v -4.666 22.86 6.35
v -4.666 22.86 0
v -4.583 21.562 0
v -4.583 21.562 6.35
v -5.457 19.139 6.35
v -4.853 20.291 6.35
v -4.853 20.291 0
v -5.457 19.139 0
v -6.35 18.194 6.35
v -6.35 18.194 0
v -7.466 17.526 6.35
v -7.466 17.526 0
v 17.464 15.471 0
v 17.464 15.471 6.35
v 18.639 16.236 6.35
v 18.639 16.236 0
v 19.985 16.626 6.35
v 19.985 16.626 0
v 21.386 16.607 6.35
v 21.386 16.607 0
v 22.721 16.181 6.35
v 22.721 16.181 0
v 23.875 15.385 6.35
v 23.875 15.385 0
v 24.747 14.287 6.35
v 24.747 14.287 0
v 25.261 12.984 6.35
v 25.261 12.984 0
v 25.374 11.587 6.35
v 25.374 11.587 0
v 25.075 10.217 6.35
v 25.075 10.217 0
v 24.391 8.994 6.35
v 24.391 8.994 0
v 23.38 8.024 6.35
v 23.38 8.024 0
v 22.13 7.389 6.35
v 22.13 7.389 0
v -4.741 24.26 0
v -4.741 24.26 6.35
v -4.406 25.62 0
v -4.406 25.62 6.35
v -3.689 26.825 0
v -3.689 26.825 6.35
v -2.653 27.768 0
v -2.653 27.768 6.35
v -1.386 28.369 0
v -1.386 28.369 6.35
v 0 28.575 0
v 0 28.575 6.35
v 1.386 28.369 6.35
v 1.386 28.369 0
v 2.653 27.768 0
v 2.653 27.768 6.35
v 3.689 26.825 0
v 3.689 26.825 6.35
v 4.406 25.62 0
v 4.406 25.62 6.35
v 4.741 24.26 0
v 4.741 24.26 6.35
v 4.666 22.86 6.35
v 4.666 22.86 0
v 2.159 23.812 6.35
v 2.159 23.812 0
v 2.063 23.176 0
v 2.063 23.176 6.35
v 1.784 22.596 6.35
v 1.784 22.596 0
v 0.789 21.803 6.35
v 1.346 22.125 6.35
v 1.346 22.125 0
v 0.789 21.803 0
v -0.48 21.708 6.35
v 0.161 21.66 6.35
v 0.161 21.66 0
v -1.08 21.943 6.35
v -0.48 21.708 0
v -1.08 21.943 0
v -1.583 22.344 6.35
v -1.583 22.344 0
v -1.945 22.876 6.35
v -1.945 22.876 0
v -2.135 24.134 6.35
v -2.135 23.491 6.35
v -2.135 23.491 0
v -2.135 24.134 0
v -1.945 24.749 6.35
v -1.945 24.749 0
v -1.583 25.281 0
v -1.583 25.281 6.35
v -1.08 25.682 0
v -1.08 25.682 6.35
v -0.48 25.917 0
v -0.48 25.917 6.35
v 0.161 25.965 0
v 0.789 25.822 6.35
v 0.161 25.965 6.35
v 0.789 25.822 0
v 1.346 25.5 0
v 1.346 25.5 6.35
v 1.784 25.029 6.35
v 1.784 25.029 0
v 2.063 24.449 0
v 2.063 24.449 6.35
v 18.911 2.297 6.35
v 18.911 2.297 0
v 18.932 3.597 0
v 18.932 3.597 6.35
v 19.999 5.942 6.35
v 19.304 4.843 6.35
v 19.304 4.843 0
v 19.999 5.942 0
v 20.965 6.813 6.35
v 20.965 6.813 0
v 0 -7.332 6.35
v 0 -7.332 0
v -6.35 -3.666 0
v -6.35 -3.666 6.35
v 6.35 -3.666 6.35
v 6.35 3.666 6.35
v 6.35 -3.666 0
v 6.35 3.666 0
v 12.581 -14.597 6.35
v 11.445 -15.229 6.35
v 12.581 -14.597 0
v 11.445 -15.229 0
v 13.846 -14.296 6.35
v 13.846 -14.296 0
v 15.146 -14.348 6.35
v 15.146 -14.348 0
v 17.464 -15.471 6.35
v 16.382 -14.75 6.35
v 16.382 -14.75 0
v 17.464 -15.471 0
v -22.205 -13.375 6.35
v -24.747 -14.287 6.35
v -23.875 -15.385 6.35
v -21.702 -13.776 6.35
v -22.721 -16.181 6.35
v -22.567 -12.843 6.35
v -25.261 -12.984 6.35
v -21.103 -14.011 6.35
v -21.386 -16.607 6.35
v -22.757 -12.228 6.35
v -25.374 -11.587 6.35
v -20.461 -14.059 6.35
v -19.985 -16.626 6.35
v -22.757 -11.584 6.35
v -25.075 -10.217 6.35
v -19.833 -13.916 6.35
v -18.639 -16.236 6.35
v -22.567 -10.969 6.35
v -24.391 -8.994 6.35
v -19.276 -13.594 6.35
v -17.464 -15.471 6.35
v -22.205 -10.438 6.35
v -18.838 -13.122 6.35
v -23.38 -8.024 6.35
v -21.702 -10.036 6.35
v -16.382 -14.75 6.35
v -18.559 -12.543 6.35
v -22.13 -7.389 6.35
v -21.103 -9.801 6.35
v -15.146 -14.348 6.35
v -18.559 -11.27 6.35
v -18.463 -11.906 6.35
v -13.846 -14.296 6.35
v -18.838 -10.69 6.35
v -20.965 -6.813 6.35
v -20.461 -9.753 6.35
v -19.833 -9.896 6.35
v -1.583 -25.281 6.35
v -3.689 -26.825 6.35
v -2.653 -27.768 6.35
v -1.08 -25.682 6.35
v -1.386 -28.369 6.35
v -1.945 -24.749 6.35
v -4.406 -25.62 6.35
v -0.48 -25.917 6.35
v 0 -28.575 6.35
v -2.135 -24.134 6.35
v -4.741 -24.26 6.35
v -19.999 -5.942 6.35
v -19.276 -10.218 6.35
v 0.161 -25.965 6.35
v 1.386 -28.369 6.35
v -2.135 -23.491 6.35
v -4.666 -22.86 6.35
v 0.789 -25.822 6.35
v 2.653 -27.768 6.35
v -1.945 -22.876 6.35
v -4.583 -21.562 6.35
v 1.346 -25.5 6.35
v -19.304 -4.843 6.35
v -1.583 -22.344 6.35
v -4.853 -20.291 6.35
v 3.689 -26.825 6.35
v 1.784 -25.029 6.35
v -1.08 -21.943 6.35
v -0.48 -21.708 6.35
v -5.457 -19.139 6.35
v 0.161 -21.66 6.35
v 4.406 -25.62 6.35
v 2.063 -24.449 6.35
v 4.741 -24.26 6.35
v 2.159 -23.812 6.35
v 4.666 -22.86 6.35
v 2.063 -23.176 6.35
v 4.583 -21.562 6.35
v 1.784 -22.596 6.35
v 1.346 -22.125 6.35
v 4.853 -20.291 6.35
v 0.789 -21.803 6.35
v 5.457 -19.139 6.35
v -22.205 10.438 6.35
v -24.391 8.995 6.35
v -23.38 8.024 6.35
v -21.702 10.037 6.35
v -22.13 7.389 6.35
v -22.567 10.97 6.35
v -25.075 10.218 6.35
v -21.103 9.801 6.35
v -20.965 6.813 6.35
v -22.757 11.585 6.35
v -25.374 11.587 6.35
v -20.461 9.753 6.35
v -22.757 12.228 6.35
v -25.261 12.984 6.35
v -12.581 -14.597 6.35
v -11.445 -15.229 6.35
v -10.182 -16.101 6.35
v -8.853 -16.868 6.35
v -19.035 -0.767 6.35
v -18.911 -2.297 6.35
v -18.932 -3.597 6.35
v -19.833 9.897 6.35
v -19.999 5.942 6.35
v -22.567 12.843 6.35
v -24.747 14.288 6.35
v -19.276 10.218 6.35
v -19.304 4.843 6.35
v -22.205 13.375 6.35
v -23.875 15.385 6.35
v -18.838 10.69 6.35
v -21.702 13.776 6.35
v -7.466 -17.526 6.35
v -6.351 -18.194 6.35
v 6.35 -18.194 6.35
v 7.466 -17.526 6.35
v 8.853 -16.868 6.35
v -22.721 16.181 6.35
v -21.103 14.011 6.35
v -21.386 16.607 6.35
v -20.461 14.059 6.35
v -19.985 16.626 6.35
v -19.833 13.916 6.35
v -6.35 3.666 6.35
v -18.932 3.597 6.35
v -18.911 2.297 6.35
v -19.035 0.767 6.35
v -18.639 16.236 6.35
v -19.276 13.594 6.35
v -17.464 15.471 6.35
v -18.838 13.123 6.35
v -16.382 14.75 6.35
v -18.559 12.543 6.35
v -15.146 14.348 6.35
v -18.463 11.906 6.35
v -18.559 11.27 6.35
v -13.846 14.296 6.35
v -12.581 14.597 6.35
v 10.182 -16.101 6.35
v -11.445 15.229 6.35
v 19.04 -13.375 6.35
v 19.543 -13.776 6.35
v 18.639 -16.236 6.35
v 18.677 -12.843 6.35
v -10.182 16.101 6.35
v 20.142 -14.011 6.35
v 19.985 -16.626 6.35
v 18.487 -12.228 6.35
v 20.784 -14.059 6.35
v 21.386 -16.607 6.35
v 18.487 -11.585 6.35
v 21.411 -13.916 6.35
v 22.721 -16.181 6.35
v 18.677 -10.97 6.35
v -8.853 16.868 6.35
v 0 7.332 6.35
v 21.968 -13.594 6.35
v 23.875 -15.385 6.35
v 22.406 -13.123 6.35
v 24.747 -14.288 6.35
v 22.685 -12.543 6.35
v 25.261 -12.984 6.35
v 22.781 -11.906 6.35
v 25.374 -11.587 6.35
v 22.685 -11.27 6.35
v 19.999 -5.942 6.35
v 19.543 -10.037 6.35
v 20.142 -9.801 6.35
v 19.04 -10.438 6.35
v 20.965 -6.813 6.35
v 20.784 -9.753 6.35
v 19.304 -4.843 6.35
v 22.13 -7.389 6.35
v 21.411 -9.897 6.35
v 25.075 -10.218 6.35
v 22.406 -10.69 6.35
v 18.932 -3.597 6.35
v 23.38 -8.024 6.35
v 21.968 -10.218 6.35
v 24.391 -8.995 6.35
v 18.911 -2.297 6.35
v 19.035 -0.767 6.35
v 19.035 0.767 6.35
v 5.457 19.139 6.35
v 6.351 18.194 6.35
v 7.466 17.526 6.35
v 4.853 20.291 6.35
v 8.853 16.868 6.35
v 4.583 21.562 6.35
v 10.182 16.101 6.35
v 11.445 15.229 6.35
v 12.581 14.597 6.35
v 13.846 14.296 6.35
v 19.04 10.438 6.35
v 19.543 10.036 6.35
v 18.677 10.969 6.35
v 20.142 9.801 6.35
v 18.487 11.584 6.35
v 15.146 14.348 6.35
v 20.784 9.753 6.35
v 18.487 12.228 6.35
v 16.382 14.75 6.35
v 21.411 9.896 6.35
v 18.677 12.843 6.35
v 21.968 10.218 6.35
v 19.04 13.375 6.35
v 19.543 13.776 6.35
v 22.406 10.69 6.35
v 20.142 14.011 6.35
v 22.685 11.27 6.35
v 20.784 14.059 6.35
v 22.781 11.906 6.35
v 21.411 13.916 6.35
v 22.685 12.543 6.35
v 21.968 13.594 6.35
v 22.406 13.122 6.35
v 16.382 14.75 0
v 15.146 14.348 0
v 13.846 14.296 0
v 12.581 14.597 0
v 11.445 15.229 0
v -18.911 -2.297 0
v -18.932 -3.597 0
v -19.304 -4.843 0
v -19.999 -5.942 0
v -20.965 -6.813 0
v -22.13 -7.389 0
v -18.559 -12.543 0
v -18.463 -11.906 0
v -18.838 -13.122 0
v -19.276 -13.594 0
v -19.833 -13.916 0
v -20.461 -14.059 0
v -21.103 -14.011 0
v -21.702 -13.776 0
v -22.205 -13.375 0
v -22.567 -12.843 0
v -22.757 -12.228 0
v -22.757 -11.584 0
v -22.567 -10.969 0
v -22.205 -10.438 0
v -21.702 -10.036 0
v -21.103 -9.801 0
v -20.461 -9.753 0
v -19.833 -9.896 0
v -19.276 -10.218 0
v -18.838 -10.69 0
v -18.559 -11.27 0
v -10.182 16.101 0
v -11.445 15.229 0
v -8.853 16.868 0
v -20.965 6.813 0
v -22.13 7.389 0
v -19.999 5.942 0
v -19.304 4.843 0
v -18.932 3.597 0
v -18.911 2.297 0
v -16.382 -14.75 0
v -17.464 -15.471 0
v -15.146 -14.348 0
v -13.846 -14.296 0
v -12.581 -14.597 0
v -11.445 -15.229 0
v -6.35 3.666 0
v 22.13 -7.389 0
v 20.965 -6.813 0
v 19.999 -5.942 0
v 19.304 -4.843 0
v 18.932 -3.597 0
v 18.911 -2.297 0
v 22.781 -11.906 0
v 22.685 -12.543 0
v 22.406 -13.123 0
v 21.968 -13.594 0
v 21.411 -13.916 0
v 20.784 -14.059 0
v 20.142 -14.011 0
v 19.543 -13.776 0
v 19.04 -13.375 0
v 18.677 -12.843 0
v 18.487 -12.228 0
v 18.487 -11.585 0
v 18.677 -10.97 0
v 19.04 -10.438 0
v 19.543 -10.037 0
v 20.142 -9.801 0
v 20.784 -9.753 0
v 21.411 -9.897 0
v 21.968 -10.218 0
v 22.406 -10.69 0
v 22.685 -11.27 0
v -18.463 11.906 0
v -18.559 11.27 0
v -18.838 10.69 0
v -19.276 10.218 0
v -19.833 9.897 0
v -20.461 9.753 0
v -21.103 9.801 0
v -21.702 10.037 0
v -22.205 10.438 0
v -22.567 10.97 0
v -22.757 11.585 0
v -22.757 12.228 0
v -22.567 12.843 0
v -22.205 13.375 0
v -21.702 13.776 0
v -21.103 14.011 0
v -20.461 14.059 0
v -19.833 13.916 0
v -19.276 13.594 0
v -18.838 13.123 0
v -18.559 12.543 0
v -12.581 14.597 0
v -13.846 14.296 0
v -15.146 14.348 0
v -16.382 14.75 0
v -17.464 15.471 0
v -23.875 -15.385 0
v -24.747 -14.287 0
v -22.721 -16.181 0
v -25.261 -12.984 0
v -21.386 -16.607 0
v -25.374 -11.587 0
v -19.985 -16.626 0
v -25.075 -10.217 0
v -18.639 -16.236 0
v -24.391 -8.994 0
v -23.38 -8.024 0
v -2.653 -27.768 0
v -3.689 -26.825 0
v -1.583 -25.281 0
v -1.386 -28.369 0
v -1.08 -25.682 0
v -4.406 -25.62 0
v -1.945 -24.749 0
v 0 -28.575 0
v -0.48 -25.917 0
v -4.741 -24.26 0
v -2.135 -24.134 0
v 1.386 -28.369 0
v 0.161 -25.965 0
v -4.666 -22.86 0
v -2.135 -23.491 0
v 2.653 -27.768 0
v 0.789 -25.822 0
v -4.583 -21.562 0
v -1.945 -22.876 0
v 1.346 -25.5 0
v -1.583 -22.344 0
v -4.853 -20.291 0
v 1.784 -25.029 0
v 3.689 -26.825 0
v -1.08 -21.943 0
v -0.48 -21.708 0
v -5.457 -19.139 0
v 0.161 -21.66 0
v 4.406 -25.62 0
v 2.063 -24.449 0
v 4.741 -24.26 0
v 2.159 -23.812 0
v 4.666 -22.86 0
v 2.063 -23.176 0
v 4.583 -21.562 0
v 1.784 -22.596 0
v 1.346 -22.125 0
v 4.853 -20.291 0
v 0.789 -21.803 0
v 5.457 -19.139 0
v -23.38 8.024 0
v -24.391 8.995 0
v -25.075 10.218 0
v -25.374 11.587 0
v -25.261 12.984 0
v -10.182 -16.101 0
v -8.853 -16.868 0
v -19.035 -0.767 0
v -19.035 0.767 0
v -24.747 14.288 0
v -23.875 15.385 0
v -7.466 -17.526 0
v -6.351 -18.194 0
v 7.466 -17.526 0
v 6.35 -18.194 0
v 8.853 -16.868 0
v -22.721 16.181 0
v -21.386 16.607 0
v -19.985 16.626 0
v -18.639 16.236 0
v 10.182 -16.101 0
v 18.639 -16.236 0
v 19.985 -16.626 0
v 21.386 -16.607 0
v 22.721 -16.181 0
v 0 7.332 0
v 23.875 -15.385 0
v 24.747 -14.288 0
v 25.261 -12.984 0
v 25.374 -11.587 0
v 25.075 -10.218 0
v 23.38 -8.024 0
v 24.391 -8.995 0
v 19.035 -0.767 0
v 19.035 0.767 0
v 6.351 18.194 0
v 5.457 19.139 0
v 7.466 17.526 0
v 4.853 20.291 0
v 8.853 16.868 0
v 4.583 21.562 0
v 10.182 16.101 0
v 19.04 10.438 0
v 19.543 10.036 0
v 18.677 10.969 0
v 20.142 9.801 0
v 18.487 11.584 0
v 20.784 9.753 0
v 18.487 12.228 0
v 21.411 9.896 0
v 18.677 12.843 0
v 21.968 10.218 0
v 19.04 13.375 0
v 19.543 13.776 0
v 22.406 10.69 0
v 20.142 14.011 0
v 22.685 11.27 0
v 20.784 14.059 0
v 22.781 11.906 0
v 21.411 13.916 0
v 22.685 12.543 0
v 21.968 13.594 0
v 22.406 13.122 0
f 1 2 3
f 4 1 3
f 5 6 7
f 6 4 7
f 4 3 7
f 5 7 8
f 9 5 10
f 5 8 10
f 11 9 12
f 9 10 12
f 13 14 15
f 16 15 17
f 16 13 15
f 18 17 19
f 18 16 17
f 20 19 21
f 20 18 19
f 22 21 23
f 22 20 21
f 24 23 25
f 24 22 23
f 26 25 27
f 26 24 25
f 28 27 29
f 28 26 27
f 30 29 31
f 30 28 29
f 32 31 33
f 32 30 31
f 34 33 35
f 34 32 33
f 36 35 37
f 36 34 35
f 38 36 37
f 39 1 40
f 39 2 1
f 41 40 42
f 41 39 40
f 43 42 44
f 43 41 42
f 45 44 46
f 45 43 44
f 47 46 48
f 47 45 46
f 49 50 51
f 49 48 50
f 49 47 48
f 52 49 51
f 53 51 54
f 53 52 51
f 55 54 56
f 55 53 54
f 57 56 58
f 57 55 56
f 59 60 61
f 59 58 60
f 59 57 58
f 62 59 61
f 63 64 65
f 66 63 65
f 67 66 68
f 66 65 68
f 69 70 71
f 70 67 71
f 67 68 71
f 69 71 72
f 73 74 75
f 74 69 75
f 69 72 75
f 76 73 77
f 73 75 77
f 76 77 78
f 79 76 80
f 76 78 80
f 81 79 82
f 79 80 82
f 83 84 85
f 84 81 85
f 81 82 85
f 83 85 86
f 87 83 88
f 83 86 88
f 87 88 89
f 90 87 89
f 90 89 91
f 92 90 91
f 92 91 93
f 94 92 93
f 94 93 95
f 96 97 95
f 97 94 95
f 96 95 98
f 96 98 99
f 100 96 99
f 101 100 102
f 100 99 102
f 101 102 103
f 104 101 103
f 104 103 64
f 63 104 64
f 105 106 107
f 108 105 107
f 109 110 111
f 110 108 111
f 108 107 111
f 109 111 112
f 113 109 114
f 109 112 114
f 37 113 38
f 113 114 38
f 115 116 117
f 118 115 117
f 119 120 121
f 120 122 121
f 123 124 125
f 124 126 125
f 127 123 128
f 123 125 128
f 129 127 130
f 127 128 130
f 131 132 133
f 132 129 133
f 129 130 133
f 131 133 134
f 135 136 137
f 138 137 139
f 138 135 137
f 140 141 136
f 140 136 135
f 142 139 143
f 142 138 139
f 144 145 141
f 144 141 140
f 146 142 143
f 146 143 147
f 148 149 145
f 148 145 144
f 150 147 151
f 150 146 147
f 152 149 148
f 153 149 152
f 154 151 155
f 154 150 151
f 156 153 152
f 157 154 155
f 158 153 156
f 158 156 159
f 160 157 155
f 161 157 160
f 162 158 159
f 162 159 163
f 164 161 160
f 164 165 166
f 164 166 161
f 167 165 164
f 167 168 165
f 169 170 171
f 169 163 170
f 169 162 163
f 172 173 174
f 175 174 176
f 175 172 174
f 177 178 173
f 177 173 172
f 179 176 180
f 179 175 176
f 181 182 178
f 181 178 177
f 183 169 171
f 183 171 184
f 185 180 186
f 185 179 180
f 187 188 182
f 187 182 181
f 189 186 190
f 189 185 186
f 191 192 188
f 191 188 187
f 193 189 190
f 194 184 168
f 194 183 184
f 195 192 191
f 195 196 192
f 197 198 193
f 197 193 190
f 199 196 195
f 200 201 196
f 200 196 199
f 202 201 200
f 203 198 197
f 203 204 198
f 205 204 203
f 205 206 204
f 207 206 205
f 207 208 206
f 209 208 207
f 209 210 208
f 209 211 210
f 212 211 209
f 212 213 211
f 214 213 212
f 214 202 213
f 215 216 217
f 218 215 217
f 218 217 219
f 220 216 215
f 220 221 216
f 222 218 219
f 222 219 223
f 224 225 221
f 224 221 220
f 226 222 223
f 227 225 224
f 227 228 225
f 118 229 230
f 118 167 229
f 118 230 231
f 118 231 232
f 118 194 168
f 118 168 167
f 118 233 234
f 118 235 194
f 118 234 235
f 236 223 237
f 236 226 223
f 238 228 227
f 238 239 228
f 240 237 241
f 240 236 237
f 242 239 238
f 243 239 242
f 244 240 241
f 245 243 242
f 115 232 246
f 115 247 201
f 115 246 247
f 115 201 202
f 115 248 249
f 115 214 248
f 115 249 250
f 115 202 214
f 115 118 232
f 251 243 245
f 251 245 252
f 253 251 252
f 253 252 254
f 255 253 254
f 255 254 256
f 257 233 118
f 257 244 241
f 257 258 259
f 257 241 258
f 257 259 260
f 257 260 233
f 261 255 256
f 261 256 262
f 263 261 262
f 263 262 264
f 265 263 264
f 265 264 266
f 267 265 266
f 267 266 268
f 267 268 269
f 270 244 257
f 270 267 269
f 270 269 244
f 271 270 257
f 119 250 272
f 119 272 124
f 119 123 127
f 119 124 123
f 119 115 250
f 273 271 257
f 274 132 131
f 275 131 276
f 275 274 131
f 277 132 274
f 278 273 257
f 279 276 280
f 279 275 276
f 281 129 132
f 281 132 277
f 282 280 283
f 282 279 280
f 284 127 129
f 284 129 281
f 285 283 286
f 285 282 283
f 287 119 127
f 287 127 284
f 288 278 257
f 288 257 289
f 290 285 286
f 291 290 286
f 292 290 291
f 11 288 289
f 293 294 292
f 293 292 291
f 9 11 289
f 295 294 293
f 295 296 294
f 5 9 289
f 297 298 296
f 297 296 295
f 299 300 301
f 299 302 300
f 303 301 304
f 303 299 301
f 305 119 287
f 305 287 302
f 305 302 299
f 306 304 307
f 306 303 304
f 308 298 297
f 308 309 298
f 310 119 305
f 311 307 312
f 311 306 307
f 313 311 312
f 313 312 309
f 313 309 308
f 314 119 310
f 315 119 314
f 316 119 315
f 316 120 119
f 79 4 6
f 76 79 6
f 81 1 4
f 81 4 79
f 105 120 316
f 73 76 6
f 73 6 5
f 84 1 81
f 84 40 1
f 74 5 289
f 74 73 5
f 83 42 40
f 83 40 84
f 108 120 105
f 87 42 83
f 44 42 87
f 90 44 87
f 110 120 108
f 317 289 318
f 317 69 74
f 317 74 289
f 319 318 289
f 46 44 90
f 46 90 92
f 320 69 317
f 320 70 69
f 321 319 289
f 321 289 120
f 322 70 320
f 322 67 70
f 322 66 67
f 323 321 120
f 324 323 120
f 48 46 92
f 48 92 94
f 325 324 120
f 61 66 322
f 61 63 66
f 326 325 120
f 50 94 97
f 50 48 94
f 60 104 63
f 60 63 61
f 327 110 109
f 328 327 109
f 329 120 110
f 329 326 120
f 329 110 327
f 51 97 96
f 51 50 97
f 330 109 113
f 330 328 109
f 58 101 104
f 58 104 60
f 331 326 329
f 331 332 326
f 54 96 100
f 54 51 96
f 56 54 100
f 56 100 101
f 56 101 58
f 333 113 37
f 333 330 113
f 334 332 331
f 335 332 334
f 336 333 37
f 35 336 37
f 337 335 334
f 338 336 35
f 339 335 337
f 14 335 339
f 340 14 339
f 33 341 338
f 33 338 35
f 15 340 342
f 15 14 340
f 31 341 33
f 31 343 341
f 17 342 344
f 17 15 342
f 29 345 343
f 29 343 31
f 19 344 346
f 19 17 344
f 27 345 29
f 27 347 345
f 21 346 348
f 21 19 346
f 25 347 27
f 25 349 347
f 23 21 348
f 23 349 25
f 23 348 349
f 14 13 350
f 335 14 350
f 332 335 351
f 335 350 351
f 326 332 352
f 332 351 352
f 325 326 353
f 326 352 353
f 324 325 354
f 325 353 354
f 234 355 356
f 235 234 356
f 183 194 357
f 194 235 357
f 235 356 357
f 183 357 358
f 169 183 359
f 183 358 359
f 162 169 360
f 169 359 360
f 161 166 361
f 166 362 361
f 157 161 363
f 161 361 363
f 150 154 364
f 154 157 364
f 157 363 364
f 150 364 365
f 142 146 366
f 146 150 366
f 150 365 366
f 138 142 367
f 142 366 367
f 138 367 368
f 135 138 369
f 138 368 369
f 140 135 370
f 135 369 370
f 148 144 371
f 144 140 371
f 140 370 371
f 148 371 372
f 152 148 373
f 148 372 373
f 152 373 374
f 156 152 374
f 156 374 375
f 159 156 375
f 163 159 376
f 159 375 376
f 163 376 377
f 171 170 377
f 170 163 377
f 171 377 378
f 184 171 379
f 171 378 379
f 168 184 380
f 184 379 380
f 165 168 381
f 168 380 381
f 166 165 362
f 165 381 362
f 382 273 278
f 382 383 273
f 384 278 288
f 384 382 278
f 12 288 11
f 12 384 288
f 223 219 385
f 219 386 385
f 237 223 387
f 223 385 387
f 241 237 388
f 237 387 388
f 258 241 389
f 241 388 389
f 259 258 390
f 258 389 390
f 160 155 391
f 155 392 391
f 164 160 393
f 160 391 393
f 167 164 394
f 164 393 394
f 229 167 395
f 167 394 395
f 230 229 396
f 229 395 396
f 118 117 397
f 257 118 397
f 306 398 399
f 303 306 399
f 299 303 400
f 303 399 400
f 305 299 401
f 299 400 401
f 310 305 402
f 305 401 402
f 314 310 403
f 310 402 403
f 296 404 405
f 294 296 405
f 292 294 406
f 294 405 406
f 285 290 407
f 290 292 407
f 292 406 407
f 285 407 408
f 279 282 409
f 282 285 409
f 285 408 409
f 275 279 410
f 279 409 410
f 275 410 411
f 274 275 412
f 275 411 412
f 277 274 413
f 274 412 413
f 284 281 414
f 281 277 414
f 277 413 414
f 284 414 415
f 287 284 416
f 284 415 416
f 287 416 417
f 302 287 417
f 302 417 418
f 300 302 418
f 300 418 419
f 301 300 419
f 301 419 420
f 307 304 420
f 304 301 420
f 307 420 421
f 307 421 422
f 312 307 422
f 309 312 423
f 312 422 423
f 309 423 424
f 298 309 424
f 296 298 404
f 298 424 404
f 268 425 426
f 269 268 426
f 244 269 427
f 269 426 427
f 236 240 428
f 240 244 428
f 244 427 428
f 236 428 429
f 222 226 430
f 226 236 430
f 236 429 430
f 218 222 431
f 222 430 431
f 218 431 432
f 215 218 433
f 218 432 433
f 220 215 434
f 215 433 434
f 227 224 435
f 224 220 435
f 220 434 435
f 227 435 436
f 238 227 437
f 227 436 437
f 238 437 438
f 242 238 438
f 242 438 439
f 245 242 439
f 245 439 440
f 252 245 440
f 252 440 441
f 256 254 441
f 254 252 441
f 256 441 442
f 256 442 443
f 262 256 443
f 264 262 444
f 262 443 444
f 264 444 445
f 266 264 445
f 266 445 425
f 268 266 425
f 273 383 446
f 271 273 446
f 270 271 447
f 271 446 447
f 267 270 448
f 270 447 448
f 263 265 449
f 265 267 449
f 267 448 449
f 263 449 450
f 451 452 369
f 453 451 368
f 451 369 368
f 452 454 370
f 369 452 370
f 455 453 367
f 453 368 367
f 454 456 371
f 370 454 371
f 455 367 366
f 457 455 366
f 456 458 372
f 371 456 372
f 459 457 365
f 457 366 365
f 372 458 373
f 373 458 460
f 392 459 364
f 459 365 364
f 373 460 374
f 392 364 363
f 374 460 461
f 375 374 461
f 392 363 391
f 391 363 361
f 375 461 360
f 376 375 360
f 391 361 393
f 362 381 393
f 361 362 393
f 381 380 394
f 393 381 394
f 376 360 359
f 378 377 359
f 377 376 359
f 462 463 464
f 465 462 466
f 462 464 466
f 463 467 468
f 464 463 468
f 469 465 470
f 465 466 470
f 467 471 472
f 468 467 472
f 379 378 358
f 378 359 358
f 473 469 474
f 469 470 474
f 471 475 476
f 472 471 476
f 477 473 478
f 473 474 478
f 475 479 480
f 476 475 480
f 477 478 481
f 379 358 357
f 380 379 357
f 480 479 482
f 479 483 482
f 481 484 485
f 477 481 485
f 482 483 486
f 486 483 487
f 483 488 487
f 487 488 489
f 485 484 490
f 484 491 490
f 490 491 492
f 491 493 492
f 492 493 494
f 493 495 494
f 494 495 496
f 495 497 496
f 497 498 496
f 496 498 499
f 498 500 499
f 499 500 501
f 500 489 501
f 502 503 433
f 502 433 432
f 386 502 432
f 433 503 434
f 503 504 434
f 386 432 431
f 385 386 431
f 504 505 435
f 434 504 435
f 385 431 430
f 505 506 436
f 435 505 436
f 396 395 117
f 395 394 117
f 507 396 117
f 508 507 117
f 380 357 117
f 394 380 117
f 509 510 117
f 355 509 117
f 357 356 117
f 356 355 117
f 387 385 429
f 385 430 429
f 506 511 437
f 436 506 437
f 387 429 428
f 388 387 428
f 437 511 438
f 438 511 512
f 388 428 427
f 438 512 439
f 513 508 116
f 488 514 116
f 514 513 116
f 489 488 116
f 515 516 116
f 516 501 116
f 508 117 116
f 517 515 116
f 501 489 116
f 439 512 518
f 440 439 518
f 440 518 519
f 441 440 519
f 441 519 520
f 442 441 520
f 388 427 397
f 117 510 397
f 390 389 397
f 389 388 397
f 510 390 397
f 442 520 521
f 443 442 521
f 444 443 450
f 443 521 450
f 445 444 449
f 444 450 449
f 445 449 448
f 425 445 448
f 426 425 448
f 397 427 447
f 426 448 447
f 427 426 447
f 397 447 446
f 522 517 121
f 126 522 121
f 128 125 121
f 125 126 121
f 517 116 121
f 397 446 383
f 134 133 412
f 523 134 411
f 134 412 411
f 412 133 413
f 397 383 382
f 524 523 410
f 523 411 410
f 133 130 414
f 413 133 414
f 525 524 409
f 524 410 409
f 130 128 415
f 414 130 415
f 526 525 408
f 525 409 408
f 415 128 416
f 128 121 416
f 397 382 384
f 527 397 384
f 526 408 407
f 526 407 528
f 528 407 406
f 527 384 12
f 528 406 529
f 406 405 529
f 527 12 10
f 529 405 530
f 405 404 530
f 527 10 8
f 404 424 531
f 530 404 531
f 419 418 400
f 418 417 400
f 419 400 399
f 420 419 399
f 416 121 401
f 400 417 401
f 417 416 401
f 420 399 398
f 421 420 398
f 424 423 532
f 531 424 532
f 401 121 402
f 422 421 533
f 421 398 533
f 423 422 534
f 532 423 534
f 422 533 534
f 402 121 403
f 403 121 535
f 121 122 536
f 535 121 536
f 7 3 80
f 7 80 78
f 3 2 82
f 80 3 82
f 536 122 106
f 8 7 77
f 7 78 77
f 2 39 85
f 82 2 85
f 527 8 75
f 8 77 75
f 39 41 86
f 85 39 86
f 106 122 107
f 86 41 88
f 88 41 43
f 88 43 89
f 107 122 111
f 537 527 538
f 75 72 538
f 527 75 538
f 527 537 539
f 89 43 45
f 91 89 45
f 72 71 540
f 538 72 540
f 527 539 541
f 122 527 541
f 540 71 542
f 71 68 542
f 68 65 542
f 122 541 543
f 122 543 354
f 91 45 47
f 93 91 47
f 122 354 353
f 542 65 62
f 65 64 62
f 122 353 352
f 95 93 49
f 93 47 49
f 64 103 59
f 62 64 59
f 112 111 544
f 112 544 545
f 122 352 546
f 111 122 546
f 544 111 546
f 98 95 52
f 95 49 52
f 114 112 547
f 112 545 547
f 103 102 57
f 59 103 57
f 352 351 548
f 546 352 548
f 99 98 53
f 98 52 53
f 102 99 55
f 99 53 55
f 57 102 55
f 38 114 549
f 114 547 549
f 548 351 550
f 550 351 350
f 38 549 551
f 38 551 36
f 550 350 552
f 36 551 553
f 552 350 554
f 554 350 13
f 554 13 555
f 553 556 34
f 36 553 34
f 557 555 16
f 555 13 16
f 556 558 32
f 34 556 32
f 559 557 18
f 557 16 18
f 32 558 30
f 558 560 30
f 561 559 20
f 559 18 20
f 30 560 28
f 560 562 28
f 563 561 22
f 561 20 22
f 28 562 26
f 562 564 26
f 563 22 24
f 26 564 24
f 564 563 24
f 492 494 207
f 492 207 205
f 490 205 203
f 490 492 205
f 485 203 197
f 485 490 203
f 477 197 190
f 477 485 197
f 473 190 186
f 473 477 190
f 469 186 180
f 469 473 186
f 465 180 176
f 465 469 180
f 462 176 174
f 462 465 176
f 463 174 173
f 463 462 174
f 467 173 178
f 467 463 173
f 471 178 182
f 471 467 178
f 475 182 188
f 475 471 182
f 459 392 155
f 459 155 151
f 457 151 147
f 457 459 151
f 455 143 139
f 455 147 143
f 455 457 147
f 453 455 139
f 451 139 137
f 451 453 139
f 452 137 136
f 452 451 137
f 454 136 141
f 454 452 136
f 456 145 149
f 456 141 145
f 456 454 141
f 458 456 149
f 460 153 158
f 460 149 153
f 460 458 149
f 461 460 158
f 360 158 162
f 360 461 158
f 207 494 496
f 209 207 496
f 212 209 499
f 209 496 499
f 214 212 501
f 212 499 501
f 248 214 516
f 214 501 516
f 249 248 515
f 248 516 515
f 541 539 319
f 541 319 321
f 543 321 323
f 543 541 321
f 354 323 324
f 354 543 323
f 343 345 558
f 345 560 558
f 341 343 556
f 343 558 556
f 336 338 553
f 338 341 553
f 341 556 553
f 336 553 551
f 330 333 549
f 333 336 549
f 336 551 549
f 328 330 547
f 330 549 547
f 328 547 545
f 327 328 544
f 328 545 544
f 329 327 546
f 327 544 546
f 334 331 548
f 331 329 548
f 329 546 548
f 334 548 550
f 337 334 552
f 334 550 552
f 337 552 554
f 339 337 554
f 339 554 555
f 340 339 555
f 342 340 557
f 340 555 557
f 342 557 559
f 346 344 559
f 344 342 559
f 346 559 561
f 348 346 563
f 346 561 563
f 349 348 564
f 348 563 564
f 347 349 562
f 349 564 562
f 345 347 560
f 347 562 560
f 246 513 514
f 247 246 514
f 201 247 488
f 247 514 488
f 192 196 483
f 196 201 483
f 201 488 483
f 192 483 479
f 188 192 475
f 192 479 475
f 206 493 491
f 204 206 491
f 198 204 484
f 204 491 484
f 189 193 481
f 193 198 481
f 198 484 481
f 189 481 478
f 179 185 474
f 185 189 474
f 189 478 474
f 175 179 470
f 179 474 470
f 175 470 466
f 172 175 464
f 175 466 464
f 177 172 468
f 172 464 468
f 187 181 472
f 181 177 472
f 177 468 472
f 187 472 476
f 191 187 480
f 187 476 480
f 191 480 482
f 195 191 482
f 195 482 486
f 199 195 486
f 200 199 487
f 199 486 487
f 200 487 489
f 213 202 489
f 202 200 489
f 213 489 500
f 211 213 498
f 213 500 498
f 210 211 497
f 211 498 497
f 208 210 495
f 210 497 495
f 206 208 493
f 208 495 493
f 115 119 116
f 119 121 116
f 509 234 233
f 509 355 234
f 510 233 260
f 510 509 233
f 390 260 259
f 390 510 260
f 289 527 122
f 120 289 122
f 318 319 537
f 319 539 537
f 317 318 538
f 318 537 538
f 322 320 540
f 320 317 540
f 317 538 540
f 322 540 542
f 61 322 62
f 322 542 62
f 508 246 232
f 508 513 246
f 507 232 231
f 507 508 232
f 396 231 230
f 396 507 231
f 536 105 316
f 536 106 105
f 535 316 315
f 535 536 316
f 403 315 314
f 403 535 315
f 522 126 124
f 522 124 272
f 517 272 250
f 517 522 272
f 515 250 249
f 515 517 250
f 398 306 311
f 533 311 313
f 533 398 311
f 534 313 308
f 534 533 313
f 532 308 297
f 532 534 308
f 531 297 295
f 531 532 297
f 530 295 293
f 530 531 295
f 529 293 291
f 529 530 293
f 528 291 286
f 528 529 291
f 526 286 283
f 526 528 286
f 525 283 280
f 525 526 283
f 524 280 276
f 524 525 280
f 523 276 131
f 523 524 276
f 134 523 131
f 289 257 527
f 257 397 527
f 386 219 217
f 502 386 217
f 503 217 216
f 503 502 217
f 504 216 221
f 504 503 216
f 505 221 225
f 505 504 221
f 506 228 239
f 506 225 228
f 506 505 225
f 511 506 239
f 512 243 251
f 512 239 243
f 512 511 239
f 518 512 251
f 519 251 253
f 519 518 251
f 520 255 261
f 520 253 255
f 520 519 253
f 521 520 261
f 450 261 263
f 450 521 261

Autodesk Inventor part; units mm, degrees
ref_plane "YZ Plane" through (0, 0, 0) normal (1, 0, 0) x (0, 1, 0)
ref_plane "XZ Plane" through (0, 0, 0) normal (0, 1, 0) x (-1, 0, 0)
ref_plane "XY Plane" through (0, 0, 0) normal (0, 0, 1) x (1, 0, 0)
sketch "Sketch1" plane through (0, 0, 0) normal (0, 0, 1) x (1, 0, 0)
  line L0 (0, 7.3323) -> (6.35, 3.6662)
  line L1 (6.35, 3.6662) -> (6.35, -3.6662)
  line L2 (6.35, -3.6662) -> (0, -7.3323)
  line L3 (0, -7.3323) -> (-6.35, -3.6662)
  line L4 (-6.35, -3.6662) -> (-6.35, 3.6662)
  line L5 (-6.35, 3.6662) -> (0, 7.3323)
  circle A0 centre (0, 23.8125) radius 2.159
  circle A1 centre (0, 0) radius 19.05
  circle A2 centre (0, 23.8125) radius 4.7625
  circle A3 centre (-20.6222, 11.9063) radius 4.7625
  circle A4 centre (-20.6222, 11.9063) radius 2.159
  circle A5 centre (-20.6222, -11.9062) radius 4.7625
  circle A6 centre (-20.6222, -11.9062) radius 2.159
  circle A7 centre (0, -23.8125) radius 4.7625
  circle A8 centre (0, -23.8125) radius 2.159
  circle A9 centre (20.6222, -11.9063) radius 4.7625
  circle A10 centre (20.6222, -11.9063) radius 2.159
  circle A11 centre (20.6222, 11.9062) radius 4.7625
  circle A12 centre (20.6222, 11.9062) radius 2.159
  arc A13 (-7.466, 17.526) -> (-4.6663, 22.86) centre (-9.3326, 21.9075) ccw
  arc A14 (4.6663, 22.86) -> (7.466, 17.526) centre (9.3326, 21.9075) ccw
  arc A15 (-18.911, 2.2972) -> (-22.1305, 7.3889) centre (-23.6387, 2.8715) ccw
  arc A16 (-17.4642, 15.4711) -> (-11.4449, 15.2288) centre (-14.3062, 19.036) ccw
  arc A17 (-11.4449, -15.2288) -> (-17.4642, -15.4711) centre (-14.3062, -19.036) ccw
  arc A18 (-22.1305, -7.3889) -> (-18.911, -2.2972) centre (-23.6387, -2.8715) ccw
  arc A19 (7.466, -17.526) -> (4.6663, -22.86) centre (9.3326, -21.9075) ccw
  arc A20 (-4.6663, -22.86) -> (-7.466, -17.526) centre (-9.3326, -21.9075) ccw
  arc A21 (18.911, -2.2972) -> (22.1305, -7.3889) centre (23.6387, -2.8715) ccw
  arc A22 (17.4642, -15.4711) -> (11.4449, -15.2288) centre (14.3062, -19.036) ccw
  arc A23 (11.4449, 15.2288) -> (17.4642, 15.4711) centre (14.3062, 19.036) ccw
  arc A24 (22.1305, 7.3889) -> (18.911, 2.2972) centre (23.6387, 2.8715) ccw
  point P0 (0, 19.05)
  point P1 (-3.6714, 18.6929)
  point P2 (-16.4978, 9.525)
  point P3 (-18.0242, 6.1669)
  point P4 (-16.4978, -9.525)
  point P5 (-14.3528, -12.526)
  point P6 (0, -19.05)
  point P7 (3.6714, -18.6929)
  point P8 (16.4978, -9.525)
  point P9 (18.0242, -6.1669)
  point P10 (16.4978, 9.525)
  point P11 (14.3528, 12.526)
  point P12 (22.1305, 7.3889)
  point P13 (11.4449, -15.2288)
  point P14 (17.4642, -15.4711)
  point P15 (22.1305, -7.3889)
  point P16 (-7.466, -17.526)
  point P17 (-4.6663, -22.86)
  point P18 (4.6663, -22.86)
  point P19 (-18.911, -2.2972)
  point P20 (-22.1305, -7.3889)
  point P21 (-17.4642, -15.4711)
  point P22 (-11.4449, -15.2288)
  point P23 (-11.4449, 15.2288)
  point P24 (-22.1305, 7.3889)
  dimension "d0" = 12.7
  dimension "d1" = 4.318
  dimension "d2" = 38.1
  dimension "d3" = 9.525
  dimension "d6" = 360
  dimension "d11" = 23.8125
  dimension "d14" = 360
extrude "Extrusion1" add sketch "Sketch1" along normal blind 6.35
properties part number "HubPlate" material "Aluminum 6061"
